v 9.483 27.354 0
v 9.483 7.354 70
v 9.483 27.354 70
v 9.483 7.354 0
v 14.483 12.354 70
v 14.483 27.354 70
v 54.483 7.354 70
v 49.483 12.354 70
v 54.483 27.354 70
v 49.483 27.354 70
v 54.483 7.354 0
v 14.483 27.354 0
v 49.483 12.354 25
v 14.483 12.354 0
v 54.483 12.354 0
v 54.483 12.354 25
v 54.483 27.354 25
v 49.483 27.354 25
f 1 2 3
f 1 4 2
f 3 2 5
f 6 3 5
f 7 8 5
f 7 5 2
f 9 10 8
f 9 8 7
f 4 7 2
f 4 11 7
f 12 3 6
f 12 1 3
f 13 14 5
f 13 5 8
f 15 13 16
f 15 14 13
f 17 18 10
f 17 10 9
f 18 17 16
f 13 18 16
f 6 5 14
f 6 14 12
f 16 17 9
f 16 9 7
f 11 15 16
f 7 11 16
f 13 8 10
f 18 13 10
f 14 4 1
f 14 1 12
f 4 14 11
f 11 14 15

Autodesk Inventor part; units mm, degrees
ref_plane "YZ Plane" through (0, 0, 0) normal (1, 0, 0) x (0, 1, 0)
ref_plane "XZ Plane" through (0, 0, 0) normal (0, 1, 0) x (-1, 0, 0)
ref_plane "XY Plane" through (0, 0, 0) normal (0, 0, 1) x (1, 0, 0)
sketch "Sketch1" plane through (0, 0, 0) normal (0, 0, 1) x (1, 0, 0)
  line L0 (14.4828, 12.3536) -> (49.4828, 12.3536)
  line L1 (49.4828, 12.3536) -> (49.4828, 27.3536)
  line L2 (14.4828, 12.3536) -> (14.4828, 27.3536)
  line L3 (54.4828, 27.3536) -> (54.4828, 7.3536)
  line L4 (54.4828, 7.3536) -> (9.4828, 7.3536)
  line L5 (9.4828, 7.3536) -> (9.4828, 27.3536)
  line L6 (9.4828, 27.3536) -> (14.4828, 27.3536)
  line L7 (49.4828, 27.3536) -> (54.4828, 27.3536)
  point P0 (0, 0)
  dimension "d0" = 35
  dimension "d1" = 15
  dimension "d2" = 15
  dimension "d3" = 5
extrude "Extrusion1" add sketch "Sketch1" along normal blind 70
sketch "Sketch3" plane through (54.4828, 7.3536, 0) normal (1, 0, 0) x (0, 0, -1)
  line L0 (0, 20) -> (0, 0) projected
  line L1 (0, 5) -> (-70, 5) projected
  line L2 (0, 20) -> (-25, 20)
  line L3 (-25, 20) -> (-25, 5)
  line L4 (-25, 5) -> (0, 5)
  line L5 (0, 5) -> (0, 20)
  point P0 (0, -7.3536)
  dimension "d6" = 25
extrude "Extrusion2" cut sketch "Sketch3" against normal blind 5
properties part number "outlifting"
